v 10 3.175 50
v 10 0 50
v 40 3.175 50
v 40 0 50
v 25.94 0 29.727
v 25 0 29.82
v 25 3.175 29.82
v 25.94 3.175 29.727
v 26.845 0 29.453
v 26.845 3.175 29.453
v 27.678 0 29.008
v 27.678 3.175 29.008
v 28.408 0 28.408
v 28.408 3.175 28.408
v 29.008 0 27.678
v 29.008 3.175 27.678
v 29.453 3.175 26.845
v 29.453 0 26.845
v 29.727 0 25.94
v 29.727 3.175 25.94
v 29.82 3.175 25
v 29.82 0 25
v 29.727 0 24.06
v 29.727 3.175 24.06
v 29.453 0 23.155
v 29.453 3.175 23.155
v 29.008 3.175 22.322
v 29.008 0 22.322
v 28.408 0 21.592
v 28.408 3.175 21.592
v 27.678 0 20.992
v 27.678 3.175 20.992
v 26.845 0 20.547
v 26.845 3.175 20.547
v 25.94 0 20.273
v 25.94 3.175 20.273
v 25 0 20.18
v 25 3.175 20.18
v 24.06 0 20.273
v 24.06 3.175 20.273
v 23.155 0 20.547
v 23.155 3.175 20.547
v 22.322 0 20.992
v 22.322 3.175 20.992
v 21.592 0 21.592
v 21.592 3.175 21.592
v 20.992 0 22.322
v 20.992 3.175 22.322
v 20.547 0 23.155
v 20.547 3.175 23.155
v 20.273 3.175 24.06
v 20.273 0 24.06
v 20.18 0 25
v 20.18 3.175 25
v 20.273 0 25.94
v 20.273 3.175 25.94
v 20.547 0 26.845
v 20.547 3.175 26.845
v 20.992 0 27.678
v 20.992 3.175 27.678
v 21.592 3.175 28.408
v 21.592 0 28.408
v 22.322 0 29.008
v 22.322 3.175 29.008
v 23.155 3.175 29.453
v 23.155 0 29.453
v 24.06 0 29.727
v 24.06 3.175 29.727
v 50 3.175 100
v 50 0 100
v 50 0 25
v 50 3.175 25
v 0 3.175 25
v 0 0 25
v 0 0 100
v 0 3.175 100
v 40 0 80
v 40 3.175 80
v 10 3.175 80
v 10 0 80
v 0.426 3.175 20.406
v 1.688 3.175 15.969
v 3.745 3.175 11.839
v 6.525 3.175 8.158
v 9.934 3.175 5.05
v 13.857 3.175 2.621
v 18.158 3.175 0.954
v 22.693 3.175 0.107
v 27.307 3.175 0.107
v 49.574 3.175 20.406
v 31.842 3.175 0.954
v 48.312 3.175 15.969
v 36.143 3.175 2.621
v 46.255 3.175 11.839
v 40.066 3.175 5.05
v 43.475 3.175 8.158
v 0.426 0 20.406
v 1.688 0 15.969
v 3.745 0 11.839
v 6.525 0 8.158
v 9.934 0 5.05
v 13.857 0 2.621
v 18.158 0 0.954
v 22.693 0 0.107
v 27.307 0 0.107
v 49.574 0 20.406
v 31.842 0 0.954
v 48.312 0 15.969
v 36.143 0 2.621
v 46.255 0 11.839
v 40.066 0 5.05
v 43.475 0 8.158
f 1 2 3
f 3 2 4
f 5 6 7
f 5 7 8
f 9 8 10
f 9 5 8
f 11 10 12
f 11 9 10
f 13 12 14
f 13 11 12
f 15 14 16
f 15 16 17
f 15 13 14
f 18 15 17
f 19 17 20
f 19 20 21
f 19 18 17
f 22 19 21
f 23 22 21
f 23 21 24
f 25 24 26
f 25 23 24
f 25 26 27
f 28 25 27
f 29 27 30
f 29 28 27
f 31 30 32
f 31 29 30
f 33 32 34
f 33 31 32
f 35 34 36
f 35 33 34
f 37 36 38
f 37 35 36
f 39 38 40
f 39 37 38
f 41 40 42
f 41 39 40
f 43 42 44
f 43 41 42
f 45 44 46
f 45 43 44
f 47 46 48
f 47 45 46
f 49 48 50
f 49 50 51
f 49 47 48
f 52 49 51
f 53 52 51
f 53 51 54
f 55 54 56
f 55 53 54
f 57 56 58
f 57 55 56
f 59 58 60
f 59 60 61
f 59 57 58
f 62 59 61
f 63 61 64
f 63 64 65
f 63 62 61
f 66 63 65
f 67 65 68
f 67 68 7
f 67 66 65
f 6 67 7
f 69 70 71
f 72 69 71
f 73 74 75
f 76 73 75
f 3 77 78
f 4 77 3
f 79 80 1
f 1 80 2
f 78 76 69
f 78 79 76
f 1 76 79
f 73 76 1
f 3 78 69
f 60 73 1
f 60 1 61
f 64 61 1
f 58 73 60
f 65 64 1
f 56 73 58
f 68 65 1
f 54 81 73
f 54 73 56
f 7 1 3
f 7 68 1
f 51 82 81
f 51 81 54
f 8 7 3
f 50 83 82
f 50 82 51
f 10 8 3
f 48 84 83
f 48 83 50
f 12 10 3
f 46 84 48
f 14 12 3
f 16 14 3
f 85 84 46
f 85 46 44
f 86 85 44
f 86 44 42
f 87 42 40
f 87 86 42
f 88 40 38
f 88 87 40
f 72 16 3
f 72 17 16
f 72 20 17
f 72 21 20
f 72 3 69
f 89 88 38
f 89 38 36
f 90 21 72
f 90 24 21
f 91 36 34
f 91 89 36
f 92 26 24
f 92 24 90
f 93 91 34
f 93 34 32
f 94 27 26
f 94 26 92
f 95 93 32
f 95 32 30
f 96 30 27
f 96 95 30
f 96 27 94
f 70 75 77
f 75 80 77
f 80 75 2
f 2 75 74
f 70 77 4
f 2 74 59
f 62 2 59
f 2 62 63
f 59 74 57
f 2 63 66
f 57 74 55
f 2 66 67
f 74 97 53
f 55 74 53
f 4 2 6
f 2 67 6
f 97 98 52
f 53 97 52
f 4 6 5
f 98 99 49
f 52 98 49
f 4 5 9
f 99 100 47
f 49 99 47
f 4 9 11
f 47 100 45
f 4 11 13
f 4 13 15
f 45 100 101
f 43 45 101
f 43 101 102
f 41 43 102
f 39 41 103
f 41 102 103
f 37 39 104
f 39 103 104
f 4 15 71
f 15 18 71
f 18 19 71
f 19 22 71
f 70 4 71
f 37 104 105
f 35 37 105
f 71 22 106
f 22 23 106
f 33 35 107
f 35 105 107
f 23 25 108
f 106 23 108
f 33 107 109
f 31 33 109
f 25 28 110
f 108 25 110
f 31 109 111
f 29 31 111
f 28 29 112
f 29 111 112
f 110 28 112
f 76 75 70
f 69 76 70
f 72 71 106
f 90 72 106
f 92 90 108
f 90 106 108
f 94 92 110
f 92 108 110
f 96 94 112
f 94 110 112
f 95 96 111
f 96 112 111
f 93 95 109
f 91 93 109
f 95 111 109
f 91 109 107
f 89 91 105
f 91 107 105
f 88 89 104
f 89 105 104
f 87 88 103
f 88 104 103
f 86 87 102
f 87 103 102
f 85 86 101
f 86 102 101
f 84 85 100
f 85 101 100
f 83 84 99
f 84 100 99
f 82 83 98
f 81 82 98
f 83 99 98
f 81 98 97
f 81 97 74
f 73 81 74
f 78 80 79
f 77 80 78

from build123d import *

# Parameters (mm, degrees)
SKETCH1_R           = 4.82
SKETCH1_W           = 30
SKETCH1_H           = 30
BOSS_EXTRUDE1_DEPTH = 3.175


with BuildPart() as part:
    # Sketch1 → Boss-Extrude1 (new body)
    with BuildSketch(Plane(origin=(0, 0, 0), x_dir=(1, 0, 0), z_dir=(0, 1, 0))):
        with BuildLine():
            ThreePointArc((50, -25), (25, 0), (0, -25))
            Line((0, -25), (0, -100))
            Line((0, -100), (50, -100))
            Line((50, -100), (50, -25))
        make_face()
        with Locations(Location((25, -25, 0), (0, 0, 270))):
            Circle(SKETCH1_R, mode=Mode.SUBTRACT)
        with Locations((25, -65)):
            Rectangle(SKETCH1_W, SKETCH1_H, mode=Mode.SUBTRACT)
    extrude(amount=BOSS_EXTRUDE1_DEPTH)


solid = part.part
